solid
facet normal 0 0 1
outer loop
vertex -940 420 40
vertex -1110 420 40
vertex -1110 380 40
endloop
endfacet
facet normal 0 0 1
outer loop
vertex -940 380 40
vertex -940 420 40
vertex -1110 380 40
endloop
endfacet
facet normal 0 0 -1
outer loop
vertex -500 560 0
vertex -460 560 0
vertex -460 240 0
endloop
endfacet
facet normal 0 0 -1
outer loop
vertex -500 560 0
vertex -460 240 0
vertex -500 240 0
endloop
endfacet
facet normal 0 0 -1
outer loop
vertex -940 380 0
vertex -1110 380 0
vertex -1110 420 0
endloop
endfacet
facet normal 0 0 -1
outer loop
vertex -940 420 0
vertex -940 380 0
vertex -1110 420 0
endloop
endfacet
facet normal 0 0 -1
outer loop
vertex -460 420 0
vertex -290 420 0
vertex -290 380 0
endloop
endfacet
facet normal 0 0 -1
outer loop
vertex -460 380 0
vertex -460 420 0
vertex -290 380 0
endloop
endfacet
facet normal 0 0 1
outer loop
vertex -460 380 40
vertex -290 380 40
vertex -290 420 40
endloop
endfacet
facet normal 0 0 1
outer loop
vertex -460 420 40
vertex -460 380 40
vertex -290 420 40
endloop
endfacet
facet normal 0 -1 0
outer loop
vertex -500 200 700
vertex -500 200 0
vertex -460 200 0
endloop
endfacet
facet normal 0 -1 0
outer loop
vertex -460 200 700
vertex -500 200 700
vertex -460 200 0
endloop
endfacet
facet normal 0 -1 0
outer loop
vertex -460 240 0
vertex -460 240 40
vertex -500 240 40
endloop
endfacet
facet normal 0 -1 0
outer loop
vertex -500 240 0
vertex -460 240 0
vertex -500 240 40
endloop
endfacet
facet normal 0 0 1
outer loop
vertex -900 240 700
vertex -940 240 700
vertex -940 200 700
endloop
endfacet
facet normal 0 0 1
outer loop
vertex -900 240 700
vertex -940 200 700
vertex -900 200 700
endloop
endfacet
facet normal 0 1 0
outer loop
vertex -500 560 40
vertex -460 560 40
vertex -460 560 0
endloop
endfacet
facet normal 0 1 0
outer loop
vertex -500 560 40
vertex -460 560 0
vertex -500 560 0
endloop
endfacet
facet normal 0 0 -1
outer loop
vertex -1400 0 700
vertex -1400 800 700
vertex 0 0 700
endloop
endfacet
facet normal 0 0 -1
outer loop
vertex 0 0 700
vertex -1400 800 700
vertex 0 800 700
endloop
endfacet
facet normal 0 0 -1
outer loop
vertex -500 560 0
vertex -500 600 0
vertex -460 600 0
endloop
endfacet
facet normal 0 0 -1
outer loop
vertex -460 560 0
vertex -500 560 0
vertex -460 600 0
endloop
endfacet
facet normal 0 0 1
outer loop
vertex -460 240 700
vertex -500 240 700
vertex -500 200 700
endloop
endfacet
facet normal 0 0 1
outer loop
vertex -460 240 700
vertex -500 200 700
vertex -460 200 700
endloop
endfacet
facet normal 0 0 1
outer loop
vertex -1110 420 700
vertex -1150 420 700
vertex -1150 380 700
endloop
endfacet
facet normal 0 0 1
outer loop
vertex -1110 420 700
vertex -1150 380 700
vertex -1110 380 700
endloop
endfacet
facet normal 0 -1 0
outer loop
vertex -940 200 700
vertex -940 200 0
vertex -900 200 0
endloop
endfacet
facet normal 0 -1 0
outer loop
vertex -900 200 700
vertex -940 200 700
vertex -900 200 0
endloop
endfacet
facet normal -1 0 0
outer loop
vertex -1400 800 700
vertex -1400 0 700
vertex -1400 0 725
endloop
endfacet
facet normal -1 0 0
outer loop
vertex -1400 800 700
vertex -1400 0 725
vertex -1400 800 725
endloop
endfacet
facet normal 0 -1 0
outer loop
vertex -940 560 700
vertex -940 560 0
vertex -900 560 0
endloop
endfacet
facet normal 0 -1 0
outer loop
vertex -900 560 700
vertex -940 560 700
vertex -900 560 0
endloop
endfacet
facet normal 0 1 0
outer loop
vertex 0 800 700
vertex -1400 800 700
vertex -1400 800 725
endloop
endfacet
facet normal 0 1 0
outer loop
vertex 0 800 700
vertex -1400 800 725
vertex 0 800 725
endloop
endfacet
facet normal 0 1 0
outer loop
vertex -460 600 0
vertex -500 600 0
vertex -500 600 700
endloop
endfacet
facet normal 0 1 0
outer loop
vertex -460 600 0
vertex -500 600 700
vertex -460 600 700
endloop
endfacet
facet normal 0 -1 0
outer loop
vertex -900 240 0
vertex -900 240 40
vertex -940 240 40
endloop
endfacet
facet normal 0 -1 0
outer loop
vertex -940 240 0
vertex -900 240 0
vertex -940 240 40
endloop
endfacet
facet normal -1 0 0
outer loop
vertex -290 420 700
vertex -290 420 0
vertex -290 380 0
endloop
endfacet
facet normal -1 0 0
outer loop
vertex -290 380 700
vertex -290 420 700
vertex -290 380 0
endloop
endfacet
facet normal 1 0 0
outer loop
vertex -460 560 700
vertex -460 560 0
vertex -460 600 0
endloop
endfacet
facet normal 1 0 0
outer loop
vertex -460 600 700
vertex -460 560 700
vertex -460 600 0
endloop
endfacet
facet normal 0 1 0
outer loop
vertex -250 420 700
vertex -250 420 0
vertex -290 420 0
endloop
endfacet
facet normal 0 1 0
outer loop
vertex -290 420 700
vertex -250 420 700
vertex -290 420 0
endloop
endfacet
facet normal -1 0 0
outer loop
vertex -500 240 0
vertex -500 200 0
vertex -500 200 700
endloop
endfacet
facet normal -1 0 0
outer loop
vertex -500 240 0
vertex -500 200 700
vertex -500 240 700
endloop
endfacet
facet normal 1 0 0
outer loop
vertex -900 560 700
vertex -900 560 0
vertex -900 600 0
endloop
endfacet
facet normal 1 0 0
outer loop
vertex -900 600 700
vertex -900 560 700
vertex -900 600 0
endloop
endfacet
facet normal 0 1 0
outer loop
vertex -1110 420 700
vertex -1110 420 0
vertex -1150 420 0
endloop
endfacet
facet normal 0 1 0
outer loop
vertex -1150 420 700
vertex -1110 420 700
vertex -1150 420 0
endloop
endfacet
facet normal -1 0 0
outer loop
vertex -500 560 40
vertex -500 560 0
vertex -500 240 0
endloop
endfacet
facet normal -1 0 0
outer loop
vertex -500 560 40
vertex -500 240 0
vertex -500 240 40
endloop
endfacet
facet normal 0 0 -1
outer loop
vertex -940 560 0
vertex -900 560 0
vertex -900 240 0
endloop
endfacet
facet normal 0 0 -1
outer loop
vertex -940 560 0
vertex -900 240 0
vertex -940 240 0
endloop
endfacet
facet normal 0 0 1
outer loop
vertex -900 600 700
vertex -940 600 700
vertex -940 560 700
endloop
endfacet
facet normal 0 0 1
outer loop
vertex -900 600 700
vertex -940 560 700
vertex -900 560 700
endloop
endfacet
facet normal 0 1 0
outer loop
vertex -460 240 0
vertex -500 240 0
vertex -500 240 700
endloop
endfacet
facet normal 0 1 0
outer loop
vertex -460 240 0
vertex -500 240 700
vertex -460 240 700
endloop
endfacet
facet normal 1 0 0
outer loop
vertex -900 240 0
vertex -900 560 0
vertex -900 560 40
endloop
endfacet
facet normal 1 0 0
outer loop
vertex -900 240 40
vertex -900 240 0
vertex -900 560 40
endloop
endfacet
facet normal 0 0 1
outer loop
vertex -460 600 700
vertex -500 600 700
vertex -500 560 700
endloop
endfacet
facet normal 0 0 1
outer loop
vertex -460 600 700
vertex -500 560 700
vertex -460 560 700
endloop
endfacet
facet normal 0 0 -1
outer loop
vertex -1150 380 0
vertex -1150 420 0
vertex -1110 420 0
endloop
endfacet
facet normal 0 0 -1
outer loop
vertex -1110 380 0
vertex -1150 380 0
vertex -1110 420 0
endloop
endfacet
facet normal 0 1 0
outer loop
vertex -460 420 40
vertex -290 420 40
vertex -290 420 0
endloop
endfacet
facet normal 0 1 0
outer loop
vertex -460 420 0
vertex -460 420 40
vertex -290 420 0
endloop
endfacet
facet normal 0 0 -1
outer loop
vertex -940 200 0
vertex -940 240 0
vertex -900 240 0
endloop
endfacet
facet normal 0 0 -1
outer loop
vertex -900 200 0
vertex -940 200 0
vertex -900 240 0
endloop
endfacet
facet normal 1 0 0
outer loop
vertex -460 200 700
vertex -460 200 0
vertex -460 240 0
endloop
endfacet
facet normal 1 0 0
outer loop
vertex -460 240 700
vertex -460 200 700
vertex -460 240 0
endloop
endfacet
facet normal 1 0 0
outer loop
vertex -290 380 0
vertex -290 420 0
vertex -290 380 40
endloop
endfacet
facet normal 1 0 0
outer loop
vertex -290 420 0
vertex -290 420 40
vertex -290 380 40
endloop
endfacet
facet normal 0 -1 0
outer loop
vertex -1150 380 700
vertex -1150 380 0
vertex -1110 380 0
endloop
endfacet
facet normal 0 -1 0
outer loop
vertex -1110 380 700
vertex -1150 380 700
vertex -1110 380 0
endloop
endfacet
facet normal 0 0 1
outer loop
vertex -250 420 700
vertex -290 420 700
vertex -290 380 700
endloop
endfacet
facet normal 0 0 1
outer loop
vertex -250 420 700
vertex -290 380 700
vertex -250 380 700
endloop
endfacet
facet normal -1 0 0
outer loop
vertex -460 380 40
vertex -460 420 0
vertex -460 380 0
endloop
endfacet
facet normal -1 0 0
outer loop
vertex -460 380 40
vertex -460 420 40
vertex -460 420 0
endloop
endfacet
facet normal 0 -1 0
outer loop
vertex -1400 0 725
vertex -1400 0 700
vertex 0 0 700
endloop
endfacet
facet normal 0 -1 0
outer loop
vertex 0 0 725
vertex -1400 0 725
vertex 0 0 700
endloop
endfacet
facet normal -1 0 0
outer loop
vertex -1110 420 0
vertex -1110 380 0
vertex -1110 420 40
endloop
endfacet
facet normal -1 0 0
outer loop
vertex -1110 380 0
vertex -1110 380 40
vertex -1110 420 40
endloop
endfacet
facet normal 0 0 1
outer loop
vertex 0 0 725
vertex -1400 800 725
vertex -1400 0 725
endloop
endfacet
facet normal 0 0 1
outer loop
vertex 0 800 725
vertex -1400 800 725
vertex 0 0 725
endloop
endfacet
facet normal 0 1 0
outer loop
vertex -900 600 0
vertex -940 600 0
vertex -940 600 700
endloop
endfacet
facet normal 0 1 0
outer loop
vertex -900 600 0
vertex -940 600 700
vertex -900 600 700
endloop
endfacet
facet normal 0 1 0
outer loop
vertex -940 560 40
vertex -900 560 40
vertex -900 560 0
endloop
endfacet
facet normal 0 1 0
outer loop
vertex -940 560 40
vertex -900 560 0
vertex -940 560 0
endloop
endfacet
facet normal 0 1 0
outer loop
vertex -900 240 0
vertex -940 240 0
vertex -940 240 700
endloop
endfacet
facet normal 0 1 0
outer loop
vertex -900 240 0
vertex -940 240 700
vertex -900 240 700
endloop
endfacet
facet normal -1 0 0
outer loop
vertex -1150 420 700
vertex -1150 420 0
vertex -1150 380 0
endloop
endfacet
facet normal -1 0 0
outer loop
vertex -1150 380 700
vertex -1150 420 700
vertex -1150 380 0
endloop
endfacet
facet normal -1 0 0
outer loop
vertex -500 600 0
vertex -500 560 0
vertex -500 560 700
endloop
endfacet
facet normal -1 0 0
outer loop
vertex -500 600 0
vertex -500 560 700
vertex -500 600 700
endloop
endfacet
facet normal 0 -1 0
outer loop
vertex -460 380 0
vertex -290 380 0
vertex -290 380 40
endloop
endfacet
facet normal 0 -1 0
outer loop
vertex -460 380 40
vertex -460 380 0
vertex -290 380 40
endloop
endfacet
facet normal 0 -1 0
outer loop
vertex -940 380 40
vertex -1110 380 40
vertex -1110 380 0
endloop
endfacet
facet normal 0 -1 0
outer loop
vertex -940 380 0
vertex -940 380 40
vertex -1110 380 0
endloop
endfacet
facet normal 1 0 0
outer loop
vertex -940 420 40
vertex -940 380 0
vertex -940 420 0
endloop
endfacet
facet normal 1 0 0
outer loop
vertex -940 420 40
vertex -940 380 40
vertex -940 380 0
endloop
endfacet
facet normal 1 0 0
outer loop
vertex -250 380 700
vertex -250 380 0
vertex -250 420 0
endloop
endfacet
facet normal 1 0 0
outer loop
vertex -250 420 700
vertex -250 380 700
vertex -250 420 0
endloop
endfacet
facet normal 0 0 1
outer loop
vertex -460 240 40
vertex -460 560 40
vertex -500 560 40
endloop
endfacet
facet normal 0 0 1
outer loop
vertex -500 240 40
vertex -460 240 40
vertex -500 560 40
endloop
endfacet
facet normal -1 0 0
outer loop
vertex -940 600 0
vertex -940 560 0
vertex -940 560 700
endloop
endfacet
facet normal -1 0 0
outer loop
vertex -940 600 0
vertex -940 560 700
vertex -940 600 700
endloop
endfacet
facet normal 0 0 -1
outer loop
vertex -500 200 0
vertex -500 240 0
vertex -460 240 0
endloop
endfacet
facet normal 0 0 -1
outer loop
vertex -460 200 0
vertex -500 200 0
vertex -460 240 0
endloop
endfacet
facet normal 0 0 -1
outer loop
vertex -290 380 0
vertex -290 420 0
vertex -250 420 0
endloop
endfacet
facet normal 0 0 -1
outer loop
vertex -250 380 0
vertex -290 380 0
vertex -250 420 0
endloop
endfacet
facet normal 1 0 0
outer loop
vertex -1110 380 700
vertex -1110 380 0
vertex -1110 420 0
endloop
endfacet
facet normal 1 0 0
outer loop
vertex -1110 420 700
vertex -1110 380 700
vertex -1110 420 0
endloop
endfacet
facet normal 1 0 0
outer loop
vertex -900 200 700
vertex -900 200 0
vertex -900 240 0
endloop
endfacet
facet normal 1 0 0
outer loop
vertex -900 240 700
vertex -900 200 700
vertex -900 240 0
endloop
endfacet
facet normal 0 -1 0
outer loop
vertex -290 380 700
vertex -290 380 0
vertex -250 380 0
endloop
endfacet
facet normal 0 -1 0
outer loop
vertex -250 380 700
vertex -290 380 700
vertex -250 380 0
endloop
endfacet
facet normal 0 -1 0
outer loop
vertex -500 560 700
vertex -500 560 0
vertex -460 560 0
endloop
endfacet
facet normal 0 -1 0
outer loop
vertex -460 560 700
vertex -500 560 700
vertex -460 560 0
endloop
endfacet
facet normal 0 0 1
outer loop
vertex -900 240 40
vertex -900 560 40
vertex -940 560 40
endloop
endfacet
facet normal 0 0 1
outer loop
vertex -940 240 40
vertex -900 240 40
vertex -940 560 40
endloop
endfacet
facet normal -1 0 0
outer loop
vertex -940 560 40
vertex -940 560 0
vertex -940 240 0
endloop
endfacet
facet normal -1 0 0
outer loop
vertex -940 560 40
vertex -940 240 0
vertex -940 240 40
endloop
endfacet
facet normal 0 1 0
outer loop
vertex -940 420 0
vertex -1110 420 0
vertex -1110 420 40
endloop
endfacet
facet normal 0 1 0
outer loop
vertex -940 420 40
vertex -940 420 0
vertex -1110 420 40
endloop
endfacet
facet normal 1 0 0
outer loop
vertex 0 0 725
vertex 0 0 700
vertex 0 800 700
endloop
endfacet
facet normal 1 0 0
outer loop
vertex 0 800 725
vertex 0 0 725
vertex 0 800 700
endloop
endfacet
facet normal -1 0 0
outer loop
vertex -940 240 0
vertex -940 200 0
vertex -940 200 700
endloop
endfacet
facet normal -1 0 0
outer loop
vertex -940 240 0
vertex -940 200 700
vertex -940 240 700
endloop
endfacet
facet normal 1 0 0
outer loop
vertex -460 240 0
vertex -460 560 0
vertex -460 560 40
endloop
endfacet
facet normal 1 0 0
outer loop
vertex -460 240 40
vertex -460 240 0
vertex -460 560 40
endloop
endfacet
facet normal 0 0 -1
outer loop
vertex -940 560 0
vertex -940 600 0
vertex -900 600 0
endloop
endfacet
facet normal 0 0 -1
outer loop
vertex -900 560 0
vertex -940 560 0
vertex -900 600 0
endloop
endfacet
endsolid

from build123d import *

# Parameters (mm, degrees)
F0_W      = 40
F0_H      = 40
F1_DEPTH  = 700
F3_W      = 40
F3_H      = 40
F4_DEPTH  = 320
F7_DEPTH  = 170
F10_DEPTH = 170
F12_W     = 1400
F12_H     = 800
F13_DEPTH = 25


with BuildPart() as f1:
    # F0 (on Top) → F1 (new body)
    with BuildSketch(Plane.XY):
        with Locations((-920, 580)):
            Rectangle(F0_W, F0_H)
    extrude(amount=F1_DEPTH)


with BuildPart() as f1b:
    # F0 (on Top) → F1, piece 2 (new body)
    with BuildSketch(Plane.XY):
        Polygon((-1150, 420), (-1150, 400), (-1150, 380), (-1110, 380), (-1110, 420), align=None)
    extrude(amount=F1_DEPTH)


with BuildPart() as f1c:
    # F0 (on Top) → F1, piece 3 (new body)
    with BuildSketch(Plane.XY):
        with Locations((-920, 220)):
            Rectangle(F0_W, F0_H)
    extrude(amount=F1_DEPTH)


with BuildPart() as f1d:
    # F0 (on Top) → F1, piece 4 (new body)
    with BuildSketch(Plane.XY):
        Polygon((-250, 400), (-250, 420), (-290, 420), (-290, 380), (-250, 380), align=None)
    extrude(amount=F1_DEPTH)


with BuildPart() as f1e:
    # F0 (on Top) → F1, piece 5 (new body)
    with BuildSketch(Plane.XY):
        with Locations((-480, 580)):
            Rectangle(F0_W, F0_H)
    extrude(amount=F1_DEPTH)


with BuildPart() as f1f:
    # F0 (on Top) → F1, piece 6 (new body)
    with BuildSketch(Plane.XY):
        with Locations((-480, 220)):
            Rectangle(F0_W, F0_H)
    extrude(amount=F1_DEPTH)


with BuildPart() as f4:
    # F3 (on offset) → F4 (new body)
    with BuildSketch(Plane(origin=(0, 240, 0), x_dir=(-1, 0, 0), z_dir=(0, 1, 0))):
        with Locations((480, 20)):
            Rectangle(F3_W, F3_H)
    extrude(amount=F4_DEPTH)


with BuildPart() as f4b:
    # F3 (on offset) → F4, piece 2 (new body)
    with BuildSketch(Plane(origin=(0, 240, 0), x_dir=(-1, 0, 0), z_dir=(0, 1, 0))):
        with Locations((920, 20)):
            Rectangle(F3_W, F3_H)
    extrude(amount=F4_DEPTH)


with BuildPart() as f7:
    # F6 (on offset) → F7 (new body)
    with BuildSketch(Plane(origin=(-290, 0, 0), x_dir=(0, -1, 0), z_dir=(-1, 0, 0))):
        Polygon((-420, 0), (-400, 0), (-380, 0), (-380, 40), (-420, 40), align=None)
    extrude(amount=F7_DEPTH)


with BuildPart() as f10:
    # F9 (on offset) → F10 (new body)
    with BuildSketch(Plane.YZ.offset(-1110)):
        Polygon((380, 0), (400, 0), (420, 0), (420, 40), (380, 40), align=None)
    extrude(amount=F10_DEPTH)


with BuildPart() as f13:
    # F12 (on offset) → F13 (new body)
    with BuildSketch(Plane.XY.offset(700)):
        with Locations((-700, 400)):
            Rectangle(F12_W, F12_H)
    extrude(amount=F13_DEPTH)


solid = Compound([f1.part, f1b.part, f1c.part, f1d.part, f1e.part, f1f.part, f4.part, f4b.part, f7.part, f10.part, f13.part])
